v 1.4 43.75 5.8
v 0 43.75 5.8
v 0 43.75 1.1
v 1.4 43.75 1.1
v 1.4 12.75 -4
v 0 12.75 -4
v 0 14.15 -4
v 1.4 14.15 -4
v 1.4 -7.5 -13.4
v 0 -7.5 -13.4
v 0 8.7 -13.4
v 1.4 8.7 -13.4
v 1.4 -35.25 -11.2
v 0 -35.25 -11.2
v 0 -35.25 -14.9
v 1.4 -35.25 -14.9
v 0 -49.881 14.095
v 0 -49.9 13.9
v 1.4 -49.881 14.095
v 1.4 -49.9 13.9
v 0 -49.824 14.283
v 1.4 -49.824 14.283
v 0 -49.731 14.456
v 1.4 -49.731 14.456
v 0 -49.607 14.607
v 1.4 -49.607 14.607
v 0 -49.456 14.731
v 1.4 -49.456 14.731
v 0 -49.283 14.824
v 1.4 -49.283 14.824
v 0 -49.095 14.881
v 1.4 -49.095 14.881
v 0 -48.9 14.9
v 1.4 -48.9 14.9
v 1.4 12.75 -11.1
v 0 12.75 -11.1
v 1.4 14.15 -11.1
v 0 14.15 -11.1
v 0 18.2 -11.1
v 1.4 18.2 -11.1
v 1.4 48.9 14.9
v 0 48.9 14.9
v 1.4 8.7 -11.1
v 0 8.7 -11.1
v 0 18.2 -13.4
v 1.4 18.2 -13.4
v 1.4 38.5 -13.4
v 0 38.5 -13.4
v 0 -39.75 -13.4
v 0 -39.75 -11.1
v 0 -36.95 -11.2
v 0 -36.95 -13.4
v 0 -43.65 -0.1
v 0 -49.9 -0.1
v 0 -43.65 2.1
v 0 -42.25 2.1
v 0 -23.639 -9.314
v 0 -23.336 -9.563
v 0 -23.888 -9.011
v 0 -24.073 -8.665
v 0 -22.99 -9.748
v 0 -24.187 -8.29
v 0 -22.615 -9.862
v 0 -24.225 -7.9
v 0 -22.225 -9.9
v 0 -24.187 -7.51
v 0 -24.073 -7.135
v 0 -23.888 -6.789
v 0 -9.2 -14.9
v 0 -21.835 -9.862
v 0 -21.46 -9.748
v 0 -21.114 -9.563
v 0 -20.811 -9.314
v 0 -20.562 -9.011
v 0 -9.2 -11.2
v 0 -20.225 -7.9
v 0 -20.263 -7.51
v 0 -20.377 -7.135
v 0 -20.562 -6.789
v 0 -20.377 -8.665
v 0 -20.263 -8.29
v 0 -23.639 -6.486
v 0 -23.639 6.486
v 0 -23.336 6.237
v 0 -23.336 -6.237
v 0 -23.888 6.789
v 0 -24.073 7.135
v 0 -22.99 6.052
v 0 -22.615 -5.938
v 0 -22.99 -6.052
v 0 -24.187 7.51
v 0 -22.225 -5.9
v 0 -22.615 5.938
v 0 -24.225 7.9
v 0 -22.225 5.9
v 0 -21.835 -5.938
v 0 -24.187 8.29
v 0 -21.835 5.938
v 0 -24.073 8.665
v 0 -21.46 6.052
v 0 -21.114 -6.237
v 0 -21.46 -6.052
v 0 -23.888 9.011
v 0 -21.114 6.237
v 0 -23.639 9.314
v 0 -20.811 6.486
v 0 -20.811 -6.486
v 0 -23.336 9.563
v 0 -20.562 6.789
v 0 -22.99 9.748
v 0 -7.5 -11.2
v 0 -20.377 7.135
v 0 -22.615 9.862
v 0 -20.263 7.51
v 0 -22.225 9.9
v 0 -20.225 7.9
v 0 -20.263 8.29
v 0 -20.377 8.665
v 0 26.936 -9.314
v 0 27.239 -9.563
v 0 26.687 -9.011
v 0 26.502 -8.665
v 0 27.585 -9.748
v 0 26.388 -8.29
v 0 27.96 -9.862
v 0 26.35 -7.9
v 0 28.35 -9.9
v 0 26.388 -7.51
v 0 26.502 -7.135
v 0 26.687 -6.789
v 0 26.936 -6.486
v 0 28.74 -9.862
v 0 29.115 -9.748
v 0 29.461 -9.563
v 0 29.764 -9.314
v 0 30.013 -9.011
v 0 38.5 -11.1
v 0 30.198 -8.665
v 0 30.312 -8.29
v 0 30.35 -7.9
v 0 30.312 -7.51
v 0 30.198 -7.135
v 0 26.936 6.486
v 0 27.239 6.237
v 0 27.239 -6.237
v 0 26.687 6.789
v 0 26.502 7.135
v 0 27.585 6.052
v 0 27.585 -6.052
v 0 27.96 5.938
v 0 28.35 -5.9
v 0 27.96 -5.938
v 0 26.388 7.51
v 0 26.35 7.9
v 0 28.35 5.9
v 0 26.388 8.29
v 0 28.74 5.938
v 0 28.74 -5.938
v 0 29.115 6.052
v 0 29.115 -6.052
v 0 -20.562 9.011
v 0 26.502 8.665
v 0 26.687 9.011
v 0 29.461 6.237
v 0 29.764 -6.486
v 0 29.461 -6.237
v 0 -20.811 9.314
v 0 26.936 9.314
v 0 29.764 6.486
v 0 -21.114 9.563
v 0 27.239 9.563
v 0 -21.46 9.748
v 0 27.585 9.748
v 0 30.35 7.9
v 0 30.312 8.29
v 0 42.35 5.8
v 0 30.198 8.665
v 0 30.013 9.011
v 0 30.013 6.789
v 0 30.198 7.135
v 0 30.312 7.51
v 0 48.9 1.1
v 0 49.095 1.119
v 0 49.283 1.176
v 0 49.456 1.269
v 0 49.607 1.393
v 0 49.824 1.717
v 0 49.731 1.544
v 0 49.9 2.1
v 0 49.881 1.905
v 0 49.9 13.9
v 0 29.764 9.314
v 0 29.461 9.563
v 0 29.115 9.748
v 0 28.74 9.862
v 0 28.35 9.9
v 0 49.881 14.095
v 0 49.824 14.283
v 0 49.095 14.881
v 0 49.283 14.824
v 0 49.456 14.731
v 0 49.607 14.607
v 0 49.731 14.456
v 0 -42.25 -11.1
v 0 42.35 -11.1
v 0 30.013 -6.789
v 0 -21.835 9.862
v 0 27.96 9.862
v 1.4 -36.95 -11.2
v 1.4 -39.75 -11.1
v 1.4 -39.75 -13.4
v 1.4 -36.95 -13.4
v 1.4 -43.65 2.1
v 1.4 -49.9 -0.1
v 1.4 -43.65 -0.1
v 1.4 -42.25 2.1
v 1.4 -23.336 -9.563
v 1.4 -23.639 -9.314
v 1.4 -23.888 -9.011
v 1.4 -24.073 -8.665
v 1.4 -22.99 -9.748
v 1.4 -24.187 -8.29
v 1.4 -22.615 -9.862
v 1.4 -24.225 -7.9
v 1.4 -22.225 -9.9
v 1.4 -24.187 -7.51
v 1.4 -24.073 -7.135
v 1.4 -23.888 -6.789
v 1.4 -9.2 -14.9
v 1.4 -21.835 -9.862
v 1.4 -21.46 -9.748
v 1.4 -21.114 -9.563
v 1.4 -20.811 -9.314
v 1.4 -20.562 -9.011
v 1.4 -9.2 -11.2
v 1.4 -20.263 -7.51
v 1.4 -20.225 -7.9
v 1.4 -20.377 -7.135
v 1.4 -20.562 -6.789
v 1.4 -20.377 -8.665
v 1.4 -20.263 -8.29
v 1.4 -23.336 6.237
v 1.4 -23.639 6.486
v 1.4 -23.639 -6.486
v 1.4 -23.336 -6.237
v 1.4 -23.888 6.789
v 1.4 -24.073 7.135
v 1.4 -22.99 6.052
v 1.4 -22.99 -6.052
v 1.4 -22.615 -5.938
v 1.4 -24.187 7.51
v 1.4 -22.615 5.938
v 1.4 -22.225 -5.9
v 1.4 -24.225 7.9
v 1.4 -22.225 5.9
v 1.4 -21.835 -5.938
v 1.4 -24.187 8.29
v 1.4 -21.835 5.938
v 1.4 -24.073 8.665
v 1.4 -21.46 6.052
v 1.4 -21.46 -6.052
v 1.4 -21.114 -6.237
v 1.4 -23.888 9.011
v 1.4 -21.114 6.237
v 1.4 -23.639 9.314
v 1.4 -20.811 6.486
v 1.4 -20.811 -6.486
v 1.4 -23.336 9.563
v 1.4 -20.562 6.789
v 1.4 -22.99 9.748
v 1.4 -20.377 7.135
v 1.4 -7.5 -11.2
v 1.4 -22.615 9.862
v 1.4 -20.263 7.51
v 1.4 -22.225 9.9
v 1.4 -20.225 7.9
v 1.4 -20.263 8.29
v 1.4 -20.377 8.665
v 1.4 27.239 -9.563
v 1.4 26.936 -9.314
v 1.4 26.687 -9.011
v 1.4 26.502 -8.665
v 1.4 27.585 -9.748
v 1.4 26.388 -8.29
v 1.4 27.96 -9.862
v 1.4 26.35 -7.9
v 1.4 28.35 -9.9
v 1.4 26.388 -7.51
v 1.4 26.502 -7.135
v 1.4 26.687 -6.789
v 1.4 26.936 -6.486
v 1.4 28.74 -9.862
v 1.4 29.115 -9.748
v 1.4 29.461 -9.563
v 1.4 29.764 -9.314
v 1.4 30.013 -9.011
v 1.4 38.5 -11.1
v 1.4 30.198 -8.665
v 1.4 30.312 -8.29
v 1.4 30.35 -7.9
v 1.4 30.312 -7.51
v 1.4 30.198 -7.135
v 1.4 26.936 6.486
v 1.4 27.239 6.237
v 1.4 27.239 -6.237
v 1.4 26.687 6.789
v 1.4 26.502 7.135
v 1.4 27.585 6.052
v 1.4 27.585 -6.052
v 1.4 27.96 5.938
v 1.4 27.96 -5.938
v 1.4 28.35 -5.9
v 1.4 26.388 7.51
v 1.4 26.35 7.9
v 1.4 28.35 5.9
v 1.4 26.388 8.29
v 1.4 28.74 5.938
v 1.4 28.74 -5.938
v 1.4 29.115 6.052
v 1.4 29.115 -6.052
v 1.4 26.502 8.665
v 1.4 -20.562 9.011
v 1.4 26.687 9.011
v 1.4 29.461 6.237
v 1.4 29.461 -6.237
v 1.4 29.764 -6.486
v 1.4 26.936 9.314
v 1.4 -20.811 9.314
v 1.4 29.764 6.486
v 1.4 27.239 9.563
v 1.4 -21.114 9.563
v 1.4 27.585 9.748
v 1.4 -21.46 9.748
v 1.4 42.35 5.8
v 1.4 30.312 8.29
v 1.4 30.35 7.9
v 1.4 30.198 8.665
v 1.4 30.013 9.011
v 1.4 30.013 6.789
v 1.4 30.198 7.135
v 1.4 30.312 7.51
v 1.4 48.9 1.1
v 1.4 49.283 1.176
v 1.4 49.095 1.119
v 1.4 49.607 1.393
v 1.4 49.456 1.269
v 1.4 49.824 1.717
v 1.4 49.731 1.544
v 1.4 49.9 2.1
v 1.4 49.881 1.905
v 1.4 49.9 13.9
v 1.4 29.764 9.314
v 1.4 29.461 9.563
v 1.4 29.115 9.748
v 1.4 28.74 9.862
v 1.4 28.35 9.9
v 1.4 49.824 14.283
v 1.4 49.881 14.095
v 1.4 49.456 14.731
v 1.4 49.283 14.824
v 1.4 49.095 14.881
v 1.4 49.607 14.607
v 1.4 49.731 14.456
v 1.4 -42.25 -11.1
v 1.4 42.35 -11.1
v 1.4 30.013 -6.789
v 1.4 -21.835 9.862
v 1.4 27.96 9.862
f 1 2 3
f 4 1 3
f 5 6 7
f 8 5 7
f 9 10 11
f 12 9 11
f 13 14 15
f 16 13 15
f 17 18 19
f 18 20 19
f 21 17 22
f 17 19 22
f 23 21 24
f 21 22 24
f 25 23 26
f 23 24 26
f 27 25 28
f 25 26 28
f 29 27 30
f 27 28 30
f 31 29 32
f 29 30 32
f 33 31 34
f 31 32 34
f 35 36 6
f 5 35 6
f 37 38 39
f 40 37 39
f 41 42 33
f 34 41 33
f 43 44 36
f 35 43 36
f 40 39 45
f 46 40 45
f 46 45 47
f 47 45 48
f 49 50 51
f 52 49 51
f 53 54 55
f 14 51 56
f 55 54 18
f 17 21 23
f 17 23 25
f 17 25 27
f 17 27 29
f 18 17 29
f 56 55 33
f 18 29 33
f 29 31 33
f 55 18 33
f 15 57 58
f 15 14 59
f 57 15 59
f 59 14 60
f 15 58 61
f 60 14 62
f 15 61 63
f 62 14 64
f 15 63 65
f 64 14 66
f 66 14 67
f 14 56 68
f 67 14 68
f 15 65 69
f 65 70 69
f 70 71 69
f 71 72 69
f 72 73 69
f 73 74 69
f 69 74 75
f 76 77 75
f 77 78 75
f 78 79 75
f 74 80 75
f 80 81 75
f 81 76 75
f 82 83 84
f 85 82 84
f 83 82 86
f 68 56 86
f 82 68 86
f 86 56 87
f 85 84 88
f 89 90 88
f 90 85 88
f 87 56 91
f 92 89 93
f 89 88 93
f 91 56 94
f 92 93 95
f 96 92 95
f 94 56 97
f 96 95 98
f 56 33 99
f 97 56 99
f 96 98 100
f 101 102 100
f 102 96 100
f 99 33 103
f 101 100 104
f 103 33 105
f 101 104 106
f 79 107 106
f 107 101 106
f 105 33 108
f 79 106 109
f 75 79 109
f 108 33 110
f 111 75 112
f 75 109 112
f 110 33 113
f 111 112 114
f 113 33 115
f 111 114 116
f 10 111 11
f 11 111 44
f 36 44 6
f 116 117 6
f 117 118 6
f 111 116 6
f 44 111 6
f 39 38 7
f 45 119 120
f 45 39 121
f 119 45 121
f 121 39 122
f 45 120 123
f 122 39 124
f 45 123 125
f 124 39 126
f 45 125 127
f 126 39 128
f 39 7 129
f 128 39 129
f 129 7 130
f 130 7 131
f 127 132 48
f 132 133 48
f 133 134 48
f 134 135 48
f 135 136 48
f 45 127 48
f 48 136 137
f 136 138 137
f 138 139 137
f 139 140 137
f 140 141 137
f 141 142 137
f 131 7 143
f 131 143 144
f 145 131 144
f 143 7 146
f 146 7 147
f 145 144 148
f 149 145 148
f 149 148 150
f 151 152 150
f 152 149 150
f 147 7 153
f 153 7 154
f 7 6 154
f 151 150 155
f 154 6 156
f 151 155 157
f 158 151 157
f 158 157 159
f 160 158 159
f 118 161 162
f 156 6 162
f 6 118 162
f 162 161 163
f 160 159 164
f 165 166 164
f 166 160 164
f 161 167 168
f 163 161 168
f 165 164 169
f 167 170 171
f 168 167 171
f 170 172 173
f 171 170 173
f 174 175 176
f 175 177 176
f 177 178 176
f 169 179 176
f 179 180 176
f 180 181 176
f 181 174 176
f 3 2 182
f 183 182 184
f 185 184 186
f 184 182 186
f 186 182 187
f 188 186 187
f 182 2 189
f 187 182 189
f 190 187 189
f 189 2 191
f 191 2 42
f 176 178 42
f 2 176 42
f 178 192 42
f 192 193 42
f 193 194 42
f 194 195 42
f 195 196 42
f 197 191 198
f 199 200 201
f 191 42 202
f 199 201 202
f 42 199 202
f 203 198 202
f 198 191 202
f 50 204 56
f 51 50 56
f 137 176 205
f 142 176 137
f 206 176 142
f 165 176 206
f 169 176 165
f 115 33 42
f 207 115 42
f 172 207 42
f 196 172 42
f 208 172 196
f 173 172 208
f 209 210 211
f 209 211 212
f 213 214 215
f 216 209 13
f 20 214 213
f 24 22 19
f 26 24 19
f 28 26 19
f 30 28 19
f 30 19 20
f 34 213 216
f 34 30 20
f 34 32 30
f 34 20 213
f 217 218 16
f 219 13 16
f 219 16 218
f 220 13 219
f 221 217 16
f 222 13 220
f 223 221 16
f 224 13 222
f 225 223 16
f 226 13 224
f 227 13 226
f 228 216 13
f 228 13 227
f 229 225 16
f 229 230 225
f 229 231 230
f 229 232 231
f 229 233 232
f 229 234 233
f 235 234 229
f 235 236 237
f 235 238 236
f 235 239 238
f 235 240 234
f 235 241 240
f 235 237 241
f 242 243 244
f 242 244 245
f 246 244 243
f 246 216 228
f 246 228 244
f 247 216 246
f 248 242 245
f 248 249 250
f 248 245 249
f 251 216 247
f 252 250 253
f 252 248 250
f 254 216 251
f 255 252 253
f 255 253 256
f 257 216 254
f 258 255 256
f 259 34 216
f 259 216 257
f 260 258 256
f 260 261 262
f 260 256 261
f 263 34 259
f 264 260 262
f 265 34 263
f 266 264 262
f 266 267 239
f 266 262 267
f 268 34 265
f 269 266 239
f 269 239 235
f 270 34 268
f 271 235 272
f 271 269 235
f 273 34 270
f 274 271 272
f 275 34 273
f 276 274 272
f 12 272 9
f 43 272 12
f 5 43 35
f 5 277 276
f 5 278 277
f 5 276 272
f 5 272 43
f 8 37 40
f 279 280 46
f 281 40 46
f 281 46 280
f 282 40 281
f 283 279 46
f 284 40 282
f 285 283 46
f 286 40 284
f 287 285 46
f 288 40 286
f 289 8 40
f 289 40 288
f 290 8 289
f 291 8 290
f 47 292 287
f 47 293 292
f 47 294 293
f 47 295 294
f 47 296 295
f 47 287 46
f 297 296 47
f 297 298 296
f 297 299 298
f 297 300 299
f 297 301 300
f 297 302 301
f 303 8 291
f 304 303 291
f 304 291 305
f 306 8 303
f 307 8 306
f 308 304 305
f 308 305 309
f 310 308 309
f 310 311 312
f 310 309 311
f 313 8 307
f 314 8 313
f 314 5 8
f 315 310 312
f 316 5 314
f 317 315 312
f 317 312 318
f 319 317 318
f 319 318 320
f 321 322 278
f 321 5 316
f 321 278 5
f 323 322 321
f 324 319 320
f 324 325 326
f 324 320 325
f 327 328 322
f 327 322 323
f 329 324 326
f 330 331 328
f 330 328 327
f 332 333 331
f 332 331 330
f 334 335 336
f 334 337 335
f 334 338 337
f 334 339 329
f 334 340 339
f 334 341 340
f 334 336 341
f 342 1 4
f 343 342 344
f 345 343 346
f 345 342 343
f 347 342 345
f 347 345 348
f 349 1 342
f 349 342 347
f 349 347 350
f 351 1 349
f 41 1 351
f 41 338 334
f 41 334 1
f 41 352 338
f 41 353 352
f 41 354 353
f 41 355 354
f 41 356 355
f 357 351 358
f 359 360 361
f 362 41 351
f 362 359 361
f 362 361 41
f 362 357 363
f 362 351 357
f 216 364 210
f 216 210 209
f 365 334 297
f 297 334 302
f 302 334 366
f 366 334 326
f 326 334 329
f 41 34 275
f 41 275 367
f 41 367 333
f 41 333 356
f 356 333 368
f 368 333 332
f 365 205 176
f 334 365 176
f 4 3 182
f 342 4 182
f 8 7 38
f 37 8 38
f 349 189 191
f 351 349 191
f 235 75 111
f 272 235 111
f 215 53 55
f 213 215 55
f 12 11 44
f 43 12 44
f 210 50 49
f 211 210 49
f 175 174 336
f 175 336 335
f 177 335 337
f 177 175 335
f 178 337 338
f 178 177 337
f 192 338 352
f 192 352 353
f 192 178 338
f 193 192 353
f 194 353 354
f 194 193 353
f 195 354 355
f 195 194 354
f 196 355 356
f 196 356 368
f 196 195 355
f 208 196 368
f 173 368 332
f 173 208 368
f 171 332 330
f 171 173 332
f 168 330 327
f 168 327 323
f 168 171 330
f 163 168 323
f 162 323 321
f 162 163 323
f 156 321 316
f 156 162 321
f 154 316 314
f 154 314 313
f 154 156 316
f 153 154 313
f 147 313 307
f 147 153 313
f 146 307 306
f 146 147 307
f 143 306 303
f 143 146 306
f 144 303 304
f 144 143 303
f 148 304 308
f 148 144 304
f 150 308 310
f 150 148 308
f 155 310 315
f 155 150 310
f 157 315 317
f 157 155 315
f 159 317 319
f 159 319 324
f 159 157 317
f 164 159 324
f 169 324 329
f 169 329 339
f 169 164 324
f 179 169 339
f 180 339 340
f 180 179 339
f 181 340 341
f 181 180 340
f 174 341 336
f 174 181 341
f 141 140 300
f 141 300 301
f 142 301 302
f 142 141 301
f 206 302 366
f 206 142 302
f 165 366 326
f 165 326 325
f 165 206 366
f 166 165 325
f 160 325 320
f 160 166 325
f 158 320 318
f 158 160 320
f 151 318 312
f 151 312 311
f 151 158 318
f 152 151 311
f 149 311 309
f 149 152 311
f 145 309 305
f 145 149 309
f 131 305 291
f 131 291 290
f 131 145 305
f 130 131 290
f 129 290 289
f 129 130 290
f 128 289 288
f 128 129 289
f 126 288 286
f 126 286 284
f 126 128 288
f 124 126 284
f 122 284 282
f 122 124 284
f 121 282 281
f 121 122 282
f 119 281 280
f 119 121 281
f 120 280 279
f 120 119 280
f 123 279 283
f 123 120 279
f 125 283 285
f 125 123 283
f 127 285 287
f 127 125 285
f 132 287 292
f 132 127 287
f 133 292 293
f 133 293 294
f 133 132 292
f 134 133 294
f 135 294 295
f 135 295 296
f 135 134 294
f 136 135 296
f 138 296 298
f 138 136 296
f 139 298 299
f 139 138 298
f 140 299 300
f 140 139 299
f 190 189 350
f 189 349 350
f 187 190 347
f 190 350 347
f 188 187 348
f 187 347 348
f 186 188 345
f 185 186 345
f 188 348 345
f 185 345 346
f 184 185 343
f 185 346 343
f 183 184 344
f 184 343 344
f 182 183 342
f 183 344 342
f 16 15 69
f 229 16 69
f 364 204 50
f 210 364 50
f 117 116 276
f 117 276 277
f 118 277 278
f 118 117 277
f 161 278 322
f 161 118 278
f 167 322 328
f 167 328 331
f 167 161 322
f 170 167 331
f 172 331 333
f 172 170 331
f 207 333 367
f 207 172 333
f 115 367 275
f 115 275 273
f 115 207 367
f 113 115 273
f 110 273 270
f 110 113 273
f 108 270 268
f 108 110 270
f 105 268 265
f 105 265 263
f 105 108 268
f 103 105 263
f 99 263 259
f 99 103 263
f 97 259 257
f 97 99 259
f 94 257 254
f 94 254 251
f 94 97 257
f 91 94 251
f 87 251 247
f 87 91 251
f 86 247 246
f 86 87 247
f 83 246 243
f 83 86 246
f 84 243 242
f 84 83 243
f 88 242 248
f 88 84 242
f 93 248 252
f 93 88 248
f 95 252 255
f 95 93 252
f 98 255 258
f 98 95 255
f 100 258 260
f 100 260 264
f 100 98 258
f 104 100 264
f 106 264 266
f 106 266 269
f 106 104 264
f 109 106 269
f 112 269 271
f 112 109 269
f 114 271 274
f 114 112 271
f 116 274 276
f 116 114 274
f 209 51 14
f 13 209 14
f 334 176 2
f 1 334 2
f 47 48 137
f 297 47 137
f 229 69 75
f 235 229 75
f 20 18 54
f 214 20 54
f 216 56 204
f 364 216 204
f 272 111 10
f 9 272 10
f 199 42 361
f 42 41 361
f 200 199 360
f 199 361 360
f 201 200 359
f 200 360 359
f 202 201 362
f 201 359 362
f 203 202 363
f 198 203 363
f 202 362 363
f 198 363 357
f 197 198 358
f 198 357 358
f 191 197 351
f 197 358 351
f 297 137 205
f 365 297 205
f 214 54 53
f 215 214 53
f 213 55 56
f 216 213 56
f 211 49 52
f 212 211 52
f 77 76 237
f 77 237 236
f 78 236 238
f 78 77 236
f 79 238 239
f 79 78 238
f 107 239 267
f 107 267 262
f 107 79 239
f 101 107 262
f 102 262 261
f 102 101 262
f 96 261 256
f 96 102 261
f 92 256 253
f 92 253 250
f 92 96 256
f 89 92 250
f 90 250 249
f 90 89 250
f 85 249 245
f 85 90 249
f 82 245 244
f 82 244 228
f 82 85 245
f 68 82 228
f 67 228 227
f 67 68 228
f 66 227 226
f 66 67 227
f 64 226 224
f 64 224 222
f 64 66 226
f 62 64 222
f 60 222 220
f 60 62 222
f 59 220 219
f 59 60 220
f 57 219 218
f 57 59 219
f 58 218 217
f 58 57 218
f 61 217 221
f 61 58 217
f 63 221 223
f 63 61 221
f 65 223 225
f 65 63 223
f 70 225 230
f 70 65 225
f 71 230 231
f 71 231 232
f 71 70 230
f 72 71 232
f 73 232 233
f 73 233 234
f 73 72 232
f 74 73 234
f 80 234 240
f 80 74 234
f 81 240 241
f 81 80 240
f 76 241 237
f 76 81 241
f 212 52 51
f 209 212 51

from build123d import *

# Parameters (mm, degrees)
F0_R     = 2
F1_DEPTH = 1.4
F2_R     = 1


with BuildPart() as f1:
    # F0 (on Right) → F1 (new body)
    with BuildSketch(Plane.YZ):
        Polygon((-35.25, -14.9), (-9.2, -14.9), (-9.2, -13.4), (-9.2, -11.2), (-7.5, -11.2), (-7.5, -13.4), (8.7, -13.4), (8.7, -11.1), (12.75, -11.1), (12.75, -4), (14.15, -4), (14.15, -11.1), (18.2, -11.1), (18.2, -13.4), (38.5, -13.4), (38.5, -11.1), (42.35, -11.1), (42.35, 5.8), (43.75, 5.8), (43.75, 1.1), (49.9, 1.1), (49.9, 14.9), (-49.9, 14.9), (-49.9, 6.4402827993), (-49.9, 2.1), (-49.9, -0.1), (-43.65, -0.1), (-43.65, 2.1), (-42.25, 2.1), (-42.25, -11.1), (-39.75, -11.1), (-39.75, -13.4), (-36.95, -13.4), (-36.95, -11.2), (-35.25, -11.2), (-35.25, -13.4), align=None)
        with Locations((-22.225, -7.9)):
            Circle(F0_R, mode=Mode.SUBTRACT)
        with Locations((28.35, -7.9)):
            Circle(F0_R, mode=Mode.SUBTRACT)
        with Locations((-22.225, 7.9)):
            Circle(F0_R, mode=Mode.SUBTRACT)
        with Locations((28.35, 7.9)):
            Circle(F0_R, mode=Mode.SUBTRACT)
    extrude(amount=F1_DEPTH)

    # F2
    f2_edges = [f1.edges().sort_by_distance(p)[0] for p in [
        (0.7, -49.9, 14.9),
        (0.7, 49.9, 14.9),
        (0.7, 49.9, 1.1),
    ]]
    fillet(f2_edges, radius=F2_R)


solid = f1.part
